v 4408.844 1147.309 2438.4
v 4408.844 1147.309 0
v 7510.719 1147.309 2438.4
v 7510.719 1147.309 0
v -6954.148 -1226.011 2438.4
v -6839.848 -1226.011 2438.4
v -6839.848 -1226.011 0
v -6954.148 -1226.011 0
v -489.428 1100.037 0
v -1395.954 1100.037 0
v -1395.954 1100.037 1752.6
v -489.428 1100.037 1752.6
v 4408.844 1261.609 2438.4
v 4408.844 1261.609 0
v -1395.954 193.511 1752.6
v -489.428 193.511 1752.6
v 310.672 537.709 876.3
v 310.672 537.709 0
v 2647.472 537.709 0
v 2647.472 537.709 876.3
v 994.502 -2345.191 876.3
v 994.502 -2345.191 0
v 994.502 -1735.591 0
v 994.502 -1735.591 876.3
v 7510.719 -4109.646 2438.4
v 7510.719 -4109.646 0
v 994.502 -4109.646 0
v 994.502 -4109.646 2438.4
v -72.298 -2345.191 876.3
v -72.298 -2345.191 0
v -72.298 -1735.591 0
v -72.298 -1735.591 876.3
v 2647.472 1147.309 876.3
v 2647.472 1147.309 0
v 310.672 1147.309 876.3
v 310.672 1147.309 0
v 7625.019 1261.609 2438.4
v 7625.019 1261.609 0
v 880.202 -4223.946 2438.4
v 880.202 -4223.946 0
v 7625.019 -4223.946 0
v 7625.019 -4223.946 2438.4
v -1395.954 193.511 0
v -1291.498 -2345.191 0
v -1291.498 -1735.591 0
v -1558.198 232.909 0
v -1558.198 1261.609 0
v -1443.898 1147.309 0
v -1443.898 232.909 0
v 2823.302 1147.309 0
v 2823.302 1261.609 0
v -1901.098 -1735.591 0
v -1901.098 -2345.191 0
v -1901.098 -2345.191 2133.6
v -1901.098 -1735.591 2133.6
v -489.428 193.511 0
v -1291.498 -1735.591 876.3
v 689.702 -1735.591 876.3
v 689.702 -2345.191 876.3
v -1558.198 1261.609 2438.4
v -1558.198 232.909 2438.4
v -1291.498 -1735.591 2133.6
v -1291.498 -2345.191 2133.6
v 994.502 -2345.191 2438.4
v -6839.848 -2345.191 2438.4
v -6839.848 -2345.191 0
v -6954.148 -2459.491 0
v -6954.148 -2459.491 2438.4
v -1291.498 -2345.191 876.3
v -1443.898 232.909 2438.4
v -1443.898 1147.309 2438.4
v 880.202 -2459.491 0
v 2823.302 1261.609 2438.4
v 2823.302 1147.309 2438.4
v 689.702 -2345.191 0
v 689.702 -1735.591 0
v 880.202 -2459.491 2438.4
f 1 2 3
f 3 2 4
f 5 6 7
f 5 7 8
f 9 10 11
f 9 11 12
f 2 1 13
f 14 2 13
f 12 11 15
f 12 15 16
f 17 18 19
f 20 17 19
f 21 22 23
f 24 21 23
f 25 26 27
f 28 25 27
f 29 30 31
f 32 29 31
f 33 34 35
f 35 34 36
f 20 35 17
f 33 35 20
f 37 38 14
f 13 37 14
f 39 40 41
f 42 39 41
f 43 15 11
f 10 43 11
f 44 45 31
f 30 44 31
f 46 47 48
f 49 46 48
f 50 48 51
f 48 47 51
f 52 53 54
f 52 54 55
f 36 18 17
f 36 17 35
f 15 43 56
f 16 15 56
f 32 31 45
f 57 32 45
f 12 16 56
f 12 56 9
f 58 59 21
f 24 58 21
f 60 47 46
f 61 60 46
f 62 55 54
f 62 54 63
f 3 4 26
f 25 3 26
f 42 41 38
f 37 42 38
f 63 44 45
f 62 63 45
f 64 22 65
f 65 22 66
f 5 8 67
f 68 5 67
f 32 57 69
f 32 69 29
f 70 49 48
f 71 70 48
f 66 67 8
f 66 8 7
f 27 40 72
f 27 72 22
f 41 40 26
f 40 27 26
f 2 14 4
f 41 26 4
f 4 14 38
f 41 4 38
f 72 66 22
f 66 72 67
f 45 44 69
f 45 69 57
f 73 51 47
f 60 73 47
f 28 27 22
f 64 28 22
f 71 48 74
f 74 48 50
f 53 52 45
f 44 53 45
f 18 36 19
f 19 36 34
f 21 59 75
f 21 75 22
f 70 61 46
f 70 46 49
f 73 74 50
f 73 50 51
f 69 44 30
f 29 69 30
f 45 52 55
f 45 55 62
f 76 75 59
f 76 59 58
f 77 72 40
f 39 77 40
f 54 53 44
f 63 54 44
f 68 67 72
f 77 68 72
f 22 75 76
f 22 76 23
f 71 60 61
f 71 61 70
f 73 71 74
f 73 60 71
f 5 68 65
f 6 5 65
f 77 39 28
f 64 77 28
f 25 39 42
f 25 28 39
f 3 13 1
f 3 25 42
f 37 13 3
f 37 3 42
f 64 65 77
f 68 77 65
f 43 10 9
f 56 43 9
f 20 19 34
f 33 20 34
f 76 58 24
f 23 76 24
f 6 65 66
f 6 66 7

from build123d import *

# Parameters (mm, degrees)
F1_DEPTH = 2438.4
F0_W     = 2438.4
F0_H     = 114.3
F0_W_2   = 609.6
F0_W_3   = 114.3
F0_W_4   = 4672.0504365921
F0_H_2   = 1650.155569458
F0_W_5   = 6516.2164274216
F0_H_3   = 5256.955569458
F0_W_6   = 3101.8743515015
F2_W     = 906.526
F2_H     = 906.526
F3_DEPTH = 1752.6
F4_W     = 914.4
F4_H     = 609.6
F4_W_2   = 304.8
F5_DEPTH = 876.3
F4_W_3   = 406.4
F4_W_4   = 609.6
F6_W     = 609.6
F6_H     = 609.6
F7_DEPTH = 2133.6


with BuildPart() as f1:
    # F0 (on Top) → F1 (new body)
    with BuildSketch(Plane.XY):
        Polygon((-1443.8976049423, 1261.6094749451), (-1558.1976049423, 1261.6094749451), (-1558.1976049423, 232.9094749451), (-1443.8976049423, 232.9094749451), (-1443.8976049423, 1147.3094749451), (2823.3023950577, 1147.3094749451), (2823.3023950577, 1261.6094749451), align=None)
    extrude(amount=F1_DEPTH)


with BuildPart() as f1b:
    # F0 (on Top) → F1, piece 2 (new body)
    with BuildSketch(Plane.XY):
        with Locations((-338.9976049423, -2402.3405250549)):
            Rectangle(F0_W, F0_H)
        with Locations((-1862.9976049423, -2402.3405250549)):
            Rectangle(F0_W_2, F0_H)
        with Locations((937.3523950577, -2402.3405250549)):
            Rectangle(F0_W_3, F0_H)
        with Locations((-4503.8228232384, -2402.3405250549)):
            Rectangle(F0_W_4, F0_H)
        with Locations((937.3523950577, -3284.5683097839)):
            Rectangle(F0_W_3, F0_H_2)
        Polygon((-6839.8480415344, -2459.4905250549), (-6839.8480415344, -2345.1905250549), (-6839.8480415344, -1226.0105609894), (-6954.1480415344, -1226.0105609894), (-6954.1480415344, -2459.4905250549), align=None)
        with Locations((937.3523950577, -4166.7960945129)):
            Rectangle(F0_W_3, F0_H)
        with Locations((4252.6106087685, -4166.7960945129)):
            Rectangle(F0_W_5, F0_H)
        with Locations((7567.8688224792, -4166.7960945129)):
            Rectangle(F0_W_3, F0_H)
        with Locations((7567.8688224792, -1481.1683097839)):
            Rectangle(F0_W_3, F0_H_3)
        with Locations((7567.8688224792, 1204.4594749451)):
            Rectangle(F0_W_3, F0_H)
        with Locations((5959.7816467285, 1204.4594749451)):
            Rectangle(F0_W_6, F0_H)
    extrude(amount=F1_DEPTH)


with BuildPart() as f3:
    # F2 (on Top) → F3 (new body)
    with BuildSketch(Plane.XY):
        with Locations((-942.6910877228, 646.7741727829)):
            Rectangle(F2_W, F2_H)
    extrude(amount=F3_DEPTH)


with BuildPart() as f5:
    # F4 (on Top) → F5 (new body)
    with BuildSketch(Plane.XY):
        with Locations((-529.4976049423, -2040.3905250549)):
            Rectangle(F4_W, F4_H)
        with Locations((-1139.0976049423, -2040.3905250549)):
            Rectangle(F4_W_2, F4_H)
    extrude(amount=F5_DEPTH)


with BuildPart() as f5b:
    # F4 (on Top) → F5, piece 2 (new body)
    with BuildSketch(Plane.XY):
        with Locations((842.1023950577, -2040.3905250549)):
            Rectangle(F4_W_2, F4_H)
    extrude(amount=F5_DEPTH)


with BuildPart() as f5c:
    # F4 (on Top) → F5, piece 3 (new body)
    with BuildSketch(Plane.XY):
        with Locations((513.8719122772, 842.5094749451)):
            Rectangle(F4_W_3, F4_H)
        with Locations((1174.2719122772, 842.5094749451)):
            Rectangle(F4_W, F4_H)
        with Locations((1834.6719122772, 842.5094749451)):
            Rectangle(F4_W_3, F4_H)
        with Locations((2342.6719122772, 842.5094749451)):
            Rectangle(F4_W_4, F4_H)
    extrude(amount=F5_DEPTH)


with BuildPart() as f7:
    # F6 (on Top) → F7 (new body)
    with BuildSketch(Plane.XY):
        with Locations((-1596.2976049423, -2040.3905250549)):
            Rectangle(F6_W, F6_H)
    extrude(amount=F7_DEPTH)


solid = Compound([f1.part, f1b.part, f3.part, f5.part, f5b.part, f5c.part, f7.part])
